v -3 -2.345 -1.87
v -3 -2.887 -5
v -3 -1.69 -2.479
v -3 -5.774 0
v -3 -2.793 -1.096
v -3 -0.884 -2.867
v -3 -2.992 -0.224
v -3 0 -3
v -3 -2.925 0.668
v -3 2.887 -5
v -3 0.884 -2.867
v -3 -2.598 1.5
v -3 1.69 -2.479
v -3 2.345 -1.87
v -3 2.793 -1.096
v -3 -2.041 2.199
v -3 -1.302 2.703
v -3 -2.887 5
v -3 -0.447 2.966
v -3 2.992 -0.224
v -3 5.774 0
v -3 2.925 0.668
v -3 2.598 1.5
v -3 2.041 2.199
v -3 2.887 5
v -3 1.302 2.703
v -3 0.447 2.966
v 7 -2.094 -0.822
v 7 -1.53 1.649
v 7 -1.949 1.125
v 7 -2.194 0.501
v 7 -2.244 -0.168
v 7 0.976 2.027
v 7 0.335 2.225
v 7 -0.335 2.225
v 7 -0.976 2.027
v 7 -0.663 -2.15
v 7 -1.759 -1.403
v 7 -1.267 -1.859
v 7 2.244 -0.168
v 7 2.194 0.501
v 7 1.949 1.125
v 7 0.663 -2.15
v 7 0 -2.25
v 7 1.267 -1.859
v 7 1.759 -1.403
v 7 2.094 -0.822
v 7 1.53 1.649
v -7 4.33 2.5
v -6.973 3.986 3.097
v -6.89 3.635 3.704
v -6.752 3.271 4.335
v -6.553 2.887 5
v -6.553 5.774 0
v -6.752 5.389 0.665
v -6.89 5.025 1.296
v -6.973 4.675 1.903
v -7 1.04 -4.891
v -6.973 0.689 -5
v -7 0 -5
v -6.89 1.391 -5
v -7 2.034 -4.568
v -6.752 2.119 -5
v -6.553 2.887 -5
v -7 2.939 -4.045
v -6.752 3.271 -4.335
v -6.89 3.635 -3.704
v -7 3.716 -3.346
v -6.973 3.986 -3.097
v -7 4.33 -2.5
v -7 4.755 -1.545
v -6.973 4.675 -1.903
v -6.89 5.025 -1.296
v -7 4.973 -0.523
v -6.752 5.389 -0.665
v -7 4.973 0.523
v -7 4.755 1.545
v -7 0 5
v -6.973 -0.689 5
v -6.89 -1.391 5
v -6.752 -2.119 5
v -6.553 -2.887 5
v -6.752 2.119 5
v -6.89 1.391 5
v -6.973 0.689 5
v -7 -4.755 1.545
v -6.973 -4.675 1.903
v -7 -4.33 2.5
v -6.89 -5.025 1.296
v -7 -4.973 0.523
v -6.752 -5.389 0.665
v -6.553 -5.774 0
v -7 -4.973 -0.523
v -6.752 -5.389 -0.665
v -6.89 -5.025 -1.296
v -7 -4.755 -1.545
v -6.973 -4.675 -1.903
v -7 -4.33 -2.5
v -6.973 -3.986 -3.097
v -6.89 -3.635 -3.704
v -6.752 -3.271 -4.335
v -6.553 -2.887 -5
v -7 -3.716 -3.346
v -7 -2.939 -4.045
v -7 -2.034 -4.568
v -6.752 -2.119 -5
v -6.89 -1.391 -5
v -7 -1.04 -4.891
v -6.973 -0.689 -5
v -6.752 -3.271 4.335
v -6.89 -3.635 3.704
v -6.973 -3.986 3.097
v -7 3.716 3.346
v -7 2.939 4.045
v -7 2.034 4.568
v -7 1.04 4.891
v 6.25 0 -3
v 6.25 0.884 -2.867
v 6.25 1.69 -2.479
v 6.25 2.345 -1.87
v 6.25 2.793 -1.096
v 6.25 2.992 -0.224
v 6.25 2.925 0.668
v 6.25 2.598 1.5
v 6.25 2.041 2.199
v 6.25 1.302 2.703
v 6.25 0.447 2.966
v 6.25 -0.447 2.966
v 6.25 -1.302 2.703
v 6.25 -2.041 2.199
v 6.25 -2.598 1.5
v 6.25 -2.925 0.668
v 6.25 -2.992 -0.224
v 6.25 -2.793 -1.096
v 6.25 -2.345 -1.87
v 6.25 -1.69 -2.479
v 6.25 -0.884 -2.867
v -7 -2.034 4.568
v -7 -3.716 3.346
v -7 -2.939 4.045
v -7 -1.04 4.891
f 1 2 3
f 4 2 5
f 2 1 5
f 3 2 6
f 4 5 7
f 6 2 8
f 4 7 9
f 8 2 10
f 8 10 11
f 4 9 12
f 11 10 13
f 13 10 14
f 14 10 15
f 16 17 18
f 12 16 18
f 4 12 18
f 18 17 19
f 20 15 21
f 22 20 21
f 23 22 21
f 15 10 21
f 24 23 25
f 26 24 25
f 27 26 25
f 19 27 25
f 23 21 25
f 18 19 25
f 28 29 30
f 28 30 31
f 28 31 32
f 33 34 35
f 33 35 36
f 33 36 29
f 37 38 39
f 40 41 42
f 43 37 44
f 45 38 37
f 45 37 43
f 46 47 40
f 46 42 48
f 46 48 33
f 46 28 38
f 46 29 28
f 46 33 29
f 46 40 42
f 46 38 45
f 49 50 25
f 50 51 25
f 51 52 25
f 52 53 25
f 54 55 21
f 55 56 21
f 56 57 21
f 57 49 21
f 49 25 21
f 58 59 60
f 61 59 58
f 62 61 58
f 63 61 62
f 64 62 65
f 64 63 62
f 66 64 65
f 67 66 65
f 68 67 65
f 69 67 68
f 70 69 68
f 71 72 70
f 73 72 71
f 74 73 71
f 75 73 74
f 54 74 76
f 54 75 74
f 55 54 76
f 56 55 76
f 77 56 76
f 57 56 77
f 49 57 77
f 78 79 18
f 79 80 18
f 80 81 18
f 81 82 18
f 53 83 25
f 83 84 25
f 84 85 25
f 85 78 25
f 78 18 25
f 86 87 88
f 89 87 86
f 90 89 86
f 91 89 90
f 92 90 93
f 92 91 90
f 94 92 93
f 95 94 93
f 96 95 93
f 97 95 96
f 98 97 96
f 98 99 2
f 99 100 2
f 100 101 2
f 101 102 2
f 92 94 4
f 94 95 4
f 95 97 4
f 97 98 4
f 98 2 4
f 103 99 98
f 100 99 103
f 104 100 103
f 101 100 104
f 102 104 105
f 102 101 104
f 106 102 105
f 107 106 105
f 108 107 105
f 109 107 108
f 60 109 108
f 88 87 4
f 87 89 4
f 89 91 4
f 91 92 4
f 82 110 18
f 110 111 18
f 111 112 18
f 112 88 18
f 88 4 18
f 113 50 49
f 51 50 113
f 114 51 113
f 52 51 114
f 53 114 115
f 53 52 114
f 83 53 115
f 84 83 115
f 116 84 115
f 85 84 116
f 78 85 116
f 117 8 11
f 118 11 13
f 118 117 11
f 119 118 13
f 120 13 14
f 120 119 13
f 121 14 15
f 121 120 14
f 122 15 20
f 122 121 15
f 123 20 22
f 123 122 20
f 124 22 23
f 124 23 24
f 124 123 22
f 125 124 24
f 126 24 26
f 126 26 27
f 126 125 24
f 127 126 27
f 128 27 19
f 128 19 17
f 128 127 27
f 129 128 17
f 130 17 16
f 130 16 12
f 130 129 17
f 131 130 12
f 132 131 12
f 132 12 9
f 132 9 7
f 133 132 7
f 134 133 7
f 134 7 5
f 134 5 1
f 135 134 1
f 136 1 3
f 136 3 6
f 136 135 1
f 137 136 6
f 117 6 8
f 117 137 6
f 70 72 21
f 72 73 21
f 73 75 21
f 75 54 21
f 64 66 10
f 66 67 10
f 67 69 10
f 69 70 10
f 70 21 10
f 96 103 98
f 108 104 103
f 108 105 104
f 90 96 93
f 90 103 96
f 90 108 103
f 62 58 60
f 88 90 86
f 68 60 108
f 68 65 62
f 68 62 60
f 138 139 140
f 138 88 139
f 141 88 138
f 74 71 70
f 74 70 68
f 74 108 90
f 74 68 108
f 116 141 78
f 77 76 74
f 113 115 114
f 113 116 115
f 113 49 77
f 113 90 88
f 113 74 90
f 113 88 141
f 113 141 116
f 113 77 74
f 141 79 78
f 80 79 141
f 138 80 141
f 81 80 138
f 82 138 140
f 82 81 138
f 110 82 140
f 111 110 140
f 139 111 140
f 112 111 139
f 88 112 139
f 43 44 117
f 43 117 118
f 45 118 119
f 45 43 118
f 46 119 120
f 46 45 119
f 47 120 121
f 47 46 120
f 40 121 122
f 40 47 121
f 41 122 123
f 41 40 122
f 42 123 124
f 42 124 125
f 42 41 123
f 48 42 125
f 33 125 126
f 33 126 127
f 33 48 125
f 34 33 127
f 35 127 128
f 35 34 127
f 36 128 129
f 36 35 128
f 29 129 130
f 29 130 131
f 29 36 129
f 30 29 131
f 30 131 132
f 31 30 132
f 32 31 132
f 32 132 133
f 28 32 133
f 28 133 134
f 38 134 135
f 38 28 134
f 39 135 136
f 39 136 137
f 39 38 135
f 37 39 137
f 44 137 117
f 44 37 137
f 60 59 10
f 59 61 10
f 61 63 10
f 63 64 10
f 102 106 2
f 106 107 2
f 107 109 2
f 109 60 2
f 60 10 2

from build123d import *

# Parameters (mm, degrees)
SKETCH2_R           = 3
BOSS_EXTRUDE1_DEPTH = 10
CHAMFER1_SIZE       = 0.75
BOSS_EXTRUDE2_DEPTH = 4
SKETCH6_OUTSIDE_W   = 68.106
SKETCH6_OUTSIDE_H   = 69.654
SKETCH6_OUTSIDE_R   = 5
CUT_EXTRUDE1_DEPTH  = 15
CUT_EXTRUDE1_TAPER  = 60


with BuildPart() as part:
    # Sketch2 → Boss-Extrude1 (new body)
    with BuildSketch(Plane(origin=(7, 0, 0), x_dir=(0, 0, -1), z_dir=(1, 0, 0))):
        Circle(SKETCH2_R)
    extrude(amount=-BOSS_EXTRUDE1_DEPTH)

    # Chamfer1
    chamfer1_edges = [part.edges().sort_by_distance(p)[0] for p in [
        (7, 0, 3),
    ]]
    chamfer(chamfer1_edges, length=CHAMFER1_SIZE)

    # Sketch3 → Boss-Extrude2 (add)
    with BuildSketch(Plane.ZY.offset(3)):
        Polygon((-5, -2.886751346), (0, -5.773502692), (5, -2.886751346), (5, 2.886751346), (0, 5.773502692), (-5, 2.886751346), align=None)
    extrude(amount=BOSS_EXTRUDE2_DEPTH)

    # Sketch6 outside → Cut-Extrude1 (cut, through all)
    with BuildSketch(Plane.ZY.offset(7)):
        Rectangle(SKETCH6_OUTSIDE_W, SKETCH6_OUTSIDE_H)
        Circle(SKETCH6_OUTSIDE_R, mode=Mode.SUBTRACT)
    extrude(amount=-CUT_EXTRUDE1_DEPTH, taper=CUT_EXTRUDE1_TAPER, mode=Mode.SUBTRACT)


solid = part.part
